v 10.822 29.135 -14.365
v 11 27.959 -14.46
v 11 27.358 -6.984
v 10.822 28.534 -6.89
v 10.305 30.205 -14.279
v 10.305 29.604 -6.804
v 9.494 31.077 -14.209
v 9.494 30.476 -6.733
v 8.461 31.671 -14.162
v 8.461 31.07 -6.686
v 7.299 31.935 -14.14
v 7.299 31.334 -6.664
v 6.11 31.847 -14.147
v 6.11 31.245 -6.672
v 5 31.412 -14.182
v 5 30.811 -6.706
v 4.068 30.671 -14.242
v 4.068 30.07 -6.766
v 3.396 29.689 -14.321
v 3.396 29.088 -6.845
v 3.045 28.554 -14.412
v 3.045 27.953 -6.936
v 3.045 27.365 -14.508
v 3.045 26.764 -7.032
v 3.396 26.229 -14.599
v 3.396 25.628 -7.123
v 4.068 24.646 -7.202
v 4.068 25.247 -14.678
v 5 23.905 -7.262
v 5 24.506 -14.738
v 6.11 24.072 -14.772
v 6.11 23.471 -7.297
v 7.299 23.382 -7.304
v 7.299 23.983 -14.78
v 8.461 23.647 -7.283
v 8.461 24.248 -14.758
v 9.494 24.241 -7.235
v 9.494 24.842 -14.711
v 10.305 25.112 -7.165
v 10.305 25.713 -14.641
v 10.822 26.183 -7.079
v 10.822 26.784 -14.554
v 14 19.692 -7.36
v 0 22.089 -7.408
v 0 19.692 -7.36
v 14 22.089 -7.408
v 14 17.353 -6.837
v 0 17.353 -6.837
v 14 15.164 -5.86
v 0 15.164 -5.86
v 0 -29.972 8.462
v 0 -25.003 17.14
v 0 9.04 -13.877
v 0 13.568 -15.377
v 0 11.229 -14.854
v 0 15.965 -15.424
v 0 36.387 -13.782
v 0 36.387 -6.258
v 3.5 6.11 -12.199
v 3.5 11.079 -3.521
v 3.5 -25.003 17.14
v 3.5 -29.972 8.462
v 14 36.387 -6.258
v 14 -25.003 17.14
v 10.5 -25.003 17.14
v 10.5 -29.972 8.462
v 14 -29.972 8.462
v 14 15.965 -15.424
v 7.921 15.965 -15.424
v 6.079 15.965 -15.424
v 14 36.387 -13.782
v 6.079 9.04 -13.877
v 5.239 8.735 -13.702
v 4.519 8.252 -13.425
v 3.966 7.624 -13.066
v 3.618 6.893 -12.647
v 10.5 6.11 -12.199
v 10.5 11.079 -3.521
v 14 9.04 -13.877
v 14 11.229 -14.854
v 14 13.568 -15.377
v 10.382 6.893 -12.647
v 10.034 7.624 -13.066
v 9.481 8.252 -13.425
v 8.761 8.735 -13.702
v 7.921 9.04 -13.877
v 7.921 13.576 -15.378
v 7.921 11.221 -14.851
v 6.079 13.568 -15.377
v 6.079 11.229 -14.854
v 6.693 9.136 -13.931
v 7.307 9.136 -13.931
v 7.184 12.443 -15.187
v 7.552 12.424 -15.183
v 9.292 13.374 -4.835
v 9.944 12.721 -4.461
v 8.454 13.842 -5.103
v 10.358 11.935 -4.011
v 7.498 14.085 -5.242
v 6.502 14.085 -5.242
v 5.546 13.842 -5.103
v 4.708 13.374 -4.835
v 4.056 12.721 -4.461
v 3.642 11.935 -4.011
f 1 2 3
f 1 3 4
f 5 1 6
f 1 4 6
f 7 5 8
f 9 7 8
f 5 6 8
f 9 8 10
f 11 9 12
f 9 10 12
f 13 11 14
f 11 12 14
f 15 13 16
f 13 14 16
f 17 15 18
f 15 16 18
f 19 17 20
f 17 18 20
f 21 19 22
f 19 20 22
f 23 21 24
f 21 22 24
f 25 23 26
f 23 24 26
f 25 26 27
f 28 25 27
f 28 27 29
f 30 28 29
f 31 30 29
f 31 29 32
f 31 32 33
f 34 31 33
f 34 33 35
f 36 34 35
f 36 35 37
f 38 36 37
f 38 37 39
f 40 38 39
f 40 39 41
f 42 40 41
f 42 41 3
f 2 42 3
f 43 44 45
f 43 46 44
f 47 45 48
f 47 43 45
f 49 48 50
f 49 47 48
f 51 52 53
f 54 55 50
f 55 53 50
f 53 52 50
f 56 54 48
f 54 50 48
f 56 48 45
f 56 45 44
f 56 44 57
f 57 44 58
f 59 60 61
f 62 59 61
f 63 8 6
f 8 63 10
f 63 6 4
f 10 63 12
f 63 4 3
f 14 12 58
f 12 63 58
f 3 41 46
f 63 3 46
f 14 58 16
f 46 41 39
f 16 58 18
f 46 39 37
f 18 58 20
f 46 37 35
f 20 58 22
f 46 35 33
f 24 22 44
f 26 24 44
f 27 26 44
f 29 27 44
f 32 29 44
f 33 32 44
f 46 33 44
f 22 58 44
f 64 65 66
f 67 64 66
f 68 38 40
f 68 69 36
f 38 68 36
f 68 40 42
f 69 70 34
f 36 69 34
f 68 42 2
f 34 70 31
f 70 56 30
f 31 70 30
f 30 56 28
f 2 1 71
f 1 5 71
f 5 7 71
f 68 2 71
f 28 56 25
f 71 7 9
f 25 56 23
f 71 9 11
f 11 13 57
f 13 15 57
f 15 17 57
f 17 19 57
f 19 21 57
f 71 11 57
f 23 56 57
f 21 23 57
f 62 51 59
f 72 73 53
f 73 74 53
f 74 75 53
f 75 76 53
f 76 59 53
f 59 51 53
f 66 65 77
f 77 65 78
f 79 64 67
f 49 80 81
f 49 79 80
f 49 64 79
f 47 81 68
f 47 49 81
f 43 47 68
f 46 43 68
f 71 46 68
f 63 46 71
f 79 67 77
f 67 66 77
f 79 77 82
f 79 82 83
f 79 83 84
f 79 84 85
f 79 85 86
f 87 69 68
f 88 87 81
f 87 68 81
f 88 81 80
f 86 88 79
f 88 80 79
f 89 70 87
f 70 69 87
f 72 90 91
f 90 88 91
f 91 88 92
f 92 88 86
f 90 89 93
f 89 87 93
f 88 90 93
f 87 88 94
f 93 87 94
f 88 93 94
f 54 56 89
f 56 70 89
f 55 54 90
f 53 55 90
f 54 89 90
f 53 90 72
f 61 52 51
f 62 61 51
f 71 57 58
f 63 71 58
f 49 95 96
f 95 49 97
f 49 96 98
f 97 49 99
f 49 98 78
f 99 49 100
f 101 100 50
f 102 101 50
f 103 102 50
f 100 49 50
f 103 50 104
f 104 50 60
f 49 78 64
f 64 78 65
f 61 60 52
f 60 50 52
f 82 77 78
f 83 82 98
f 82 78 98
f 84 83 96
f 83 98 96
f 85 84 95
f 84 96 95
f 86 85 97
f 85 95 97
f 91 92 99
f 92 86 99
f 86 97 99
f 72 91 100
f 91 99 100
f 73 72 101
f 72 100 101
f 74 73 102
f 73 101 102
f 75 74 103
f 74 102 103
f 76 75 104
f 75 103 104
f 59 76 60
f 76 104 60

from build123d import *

# Parameters (mm, degrees)
F0_R     = 3.1
F1_DEPTH = 14
F2_R     = 4
F3_DEPTH = 25
F5_DEPTH = 25
F6_R     = 12


with BuildPart() as f1:
    # F0 (on Right) → F1 (new body)
    with BuildSketch(Plane.YZ):
        Polygon((36.3872624823, -13.7823516789), (36.3872624823, -6.2581492842), (18.3872624823, -7.7053745112), (-25.0031341377, 17.139614544), (-29.9721319488, 8.46153522), (12.2630268532, -15.7219740336), align=None)
        with Locations((-22.3021764927, 9.8314245335)):
            Circle(F0_R, mode=Mode.SUBTRACT)
        with Locations((-22.3021764927, 9.8314245335)):
            Circle(F0_R)
    extrude(amount=F1_DEPTH)

    # F2 (on face) → F3 (cut)
    with BuildSketch(Plane(origin=(0, 0.733642711, -9.1247502824), x_dir=(1, 0, 0), z_dir=(0, -0.0801427819, 0.996783394))):
        with Locations((7, 26.7105877545)):
            Circle(F2_R)
    extrude(amount=-F3_DEPTH, mode=Mode.SUBTRACT)

    # F4 (on face) → F5 (cut)
    with BuildSketch(Plane(origin=(0, 1.2173257447, 2.1259919559), x_dir=(1, 0, 0), z_dir=(0, 0.4968997811, 0.8678079324))):
        with BuildLine():
            ThreePointArc((3.5, -37.5475101173), (7, -41.0475101173), (10.5, -37.5475101173))
            Line((10.5, -37.5475101173), (10.5, 11.3638080657))
            ThreePointArc((10.5, 11.3638080657), (7, 14.8638080657), (3.5, 11.3638080657))
            Line((3.5, 11.3638080657), (3.5, -37.5475101173))
        make_face()
    extrude(amount=-F5_DEPTH, mode=Mode.SUBTRACT)

    # F6
    f6_edges = [f1.edges().sort_by_distance(p)[0] for p in [
        (7, 18.387262, -7.705375),
        (7, 12.263027, -15.721974),
    ]]
    fillet(f6_edges, radius=F6_R)


solid = f1.part
